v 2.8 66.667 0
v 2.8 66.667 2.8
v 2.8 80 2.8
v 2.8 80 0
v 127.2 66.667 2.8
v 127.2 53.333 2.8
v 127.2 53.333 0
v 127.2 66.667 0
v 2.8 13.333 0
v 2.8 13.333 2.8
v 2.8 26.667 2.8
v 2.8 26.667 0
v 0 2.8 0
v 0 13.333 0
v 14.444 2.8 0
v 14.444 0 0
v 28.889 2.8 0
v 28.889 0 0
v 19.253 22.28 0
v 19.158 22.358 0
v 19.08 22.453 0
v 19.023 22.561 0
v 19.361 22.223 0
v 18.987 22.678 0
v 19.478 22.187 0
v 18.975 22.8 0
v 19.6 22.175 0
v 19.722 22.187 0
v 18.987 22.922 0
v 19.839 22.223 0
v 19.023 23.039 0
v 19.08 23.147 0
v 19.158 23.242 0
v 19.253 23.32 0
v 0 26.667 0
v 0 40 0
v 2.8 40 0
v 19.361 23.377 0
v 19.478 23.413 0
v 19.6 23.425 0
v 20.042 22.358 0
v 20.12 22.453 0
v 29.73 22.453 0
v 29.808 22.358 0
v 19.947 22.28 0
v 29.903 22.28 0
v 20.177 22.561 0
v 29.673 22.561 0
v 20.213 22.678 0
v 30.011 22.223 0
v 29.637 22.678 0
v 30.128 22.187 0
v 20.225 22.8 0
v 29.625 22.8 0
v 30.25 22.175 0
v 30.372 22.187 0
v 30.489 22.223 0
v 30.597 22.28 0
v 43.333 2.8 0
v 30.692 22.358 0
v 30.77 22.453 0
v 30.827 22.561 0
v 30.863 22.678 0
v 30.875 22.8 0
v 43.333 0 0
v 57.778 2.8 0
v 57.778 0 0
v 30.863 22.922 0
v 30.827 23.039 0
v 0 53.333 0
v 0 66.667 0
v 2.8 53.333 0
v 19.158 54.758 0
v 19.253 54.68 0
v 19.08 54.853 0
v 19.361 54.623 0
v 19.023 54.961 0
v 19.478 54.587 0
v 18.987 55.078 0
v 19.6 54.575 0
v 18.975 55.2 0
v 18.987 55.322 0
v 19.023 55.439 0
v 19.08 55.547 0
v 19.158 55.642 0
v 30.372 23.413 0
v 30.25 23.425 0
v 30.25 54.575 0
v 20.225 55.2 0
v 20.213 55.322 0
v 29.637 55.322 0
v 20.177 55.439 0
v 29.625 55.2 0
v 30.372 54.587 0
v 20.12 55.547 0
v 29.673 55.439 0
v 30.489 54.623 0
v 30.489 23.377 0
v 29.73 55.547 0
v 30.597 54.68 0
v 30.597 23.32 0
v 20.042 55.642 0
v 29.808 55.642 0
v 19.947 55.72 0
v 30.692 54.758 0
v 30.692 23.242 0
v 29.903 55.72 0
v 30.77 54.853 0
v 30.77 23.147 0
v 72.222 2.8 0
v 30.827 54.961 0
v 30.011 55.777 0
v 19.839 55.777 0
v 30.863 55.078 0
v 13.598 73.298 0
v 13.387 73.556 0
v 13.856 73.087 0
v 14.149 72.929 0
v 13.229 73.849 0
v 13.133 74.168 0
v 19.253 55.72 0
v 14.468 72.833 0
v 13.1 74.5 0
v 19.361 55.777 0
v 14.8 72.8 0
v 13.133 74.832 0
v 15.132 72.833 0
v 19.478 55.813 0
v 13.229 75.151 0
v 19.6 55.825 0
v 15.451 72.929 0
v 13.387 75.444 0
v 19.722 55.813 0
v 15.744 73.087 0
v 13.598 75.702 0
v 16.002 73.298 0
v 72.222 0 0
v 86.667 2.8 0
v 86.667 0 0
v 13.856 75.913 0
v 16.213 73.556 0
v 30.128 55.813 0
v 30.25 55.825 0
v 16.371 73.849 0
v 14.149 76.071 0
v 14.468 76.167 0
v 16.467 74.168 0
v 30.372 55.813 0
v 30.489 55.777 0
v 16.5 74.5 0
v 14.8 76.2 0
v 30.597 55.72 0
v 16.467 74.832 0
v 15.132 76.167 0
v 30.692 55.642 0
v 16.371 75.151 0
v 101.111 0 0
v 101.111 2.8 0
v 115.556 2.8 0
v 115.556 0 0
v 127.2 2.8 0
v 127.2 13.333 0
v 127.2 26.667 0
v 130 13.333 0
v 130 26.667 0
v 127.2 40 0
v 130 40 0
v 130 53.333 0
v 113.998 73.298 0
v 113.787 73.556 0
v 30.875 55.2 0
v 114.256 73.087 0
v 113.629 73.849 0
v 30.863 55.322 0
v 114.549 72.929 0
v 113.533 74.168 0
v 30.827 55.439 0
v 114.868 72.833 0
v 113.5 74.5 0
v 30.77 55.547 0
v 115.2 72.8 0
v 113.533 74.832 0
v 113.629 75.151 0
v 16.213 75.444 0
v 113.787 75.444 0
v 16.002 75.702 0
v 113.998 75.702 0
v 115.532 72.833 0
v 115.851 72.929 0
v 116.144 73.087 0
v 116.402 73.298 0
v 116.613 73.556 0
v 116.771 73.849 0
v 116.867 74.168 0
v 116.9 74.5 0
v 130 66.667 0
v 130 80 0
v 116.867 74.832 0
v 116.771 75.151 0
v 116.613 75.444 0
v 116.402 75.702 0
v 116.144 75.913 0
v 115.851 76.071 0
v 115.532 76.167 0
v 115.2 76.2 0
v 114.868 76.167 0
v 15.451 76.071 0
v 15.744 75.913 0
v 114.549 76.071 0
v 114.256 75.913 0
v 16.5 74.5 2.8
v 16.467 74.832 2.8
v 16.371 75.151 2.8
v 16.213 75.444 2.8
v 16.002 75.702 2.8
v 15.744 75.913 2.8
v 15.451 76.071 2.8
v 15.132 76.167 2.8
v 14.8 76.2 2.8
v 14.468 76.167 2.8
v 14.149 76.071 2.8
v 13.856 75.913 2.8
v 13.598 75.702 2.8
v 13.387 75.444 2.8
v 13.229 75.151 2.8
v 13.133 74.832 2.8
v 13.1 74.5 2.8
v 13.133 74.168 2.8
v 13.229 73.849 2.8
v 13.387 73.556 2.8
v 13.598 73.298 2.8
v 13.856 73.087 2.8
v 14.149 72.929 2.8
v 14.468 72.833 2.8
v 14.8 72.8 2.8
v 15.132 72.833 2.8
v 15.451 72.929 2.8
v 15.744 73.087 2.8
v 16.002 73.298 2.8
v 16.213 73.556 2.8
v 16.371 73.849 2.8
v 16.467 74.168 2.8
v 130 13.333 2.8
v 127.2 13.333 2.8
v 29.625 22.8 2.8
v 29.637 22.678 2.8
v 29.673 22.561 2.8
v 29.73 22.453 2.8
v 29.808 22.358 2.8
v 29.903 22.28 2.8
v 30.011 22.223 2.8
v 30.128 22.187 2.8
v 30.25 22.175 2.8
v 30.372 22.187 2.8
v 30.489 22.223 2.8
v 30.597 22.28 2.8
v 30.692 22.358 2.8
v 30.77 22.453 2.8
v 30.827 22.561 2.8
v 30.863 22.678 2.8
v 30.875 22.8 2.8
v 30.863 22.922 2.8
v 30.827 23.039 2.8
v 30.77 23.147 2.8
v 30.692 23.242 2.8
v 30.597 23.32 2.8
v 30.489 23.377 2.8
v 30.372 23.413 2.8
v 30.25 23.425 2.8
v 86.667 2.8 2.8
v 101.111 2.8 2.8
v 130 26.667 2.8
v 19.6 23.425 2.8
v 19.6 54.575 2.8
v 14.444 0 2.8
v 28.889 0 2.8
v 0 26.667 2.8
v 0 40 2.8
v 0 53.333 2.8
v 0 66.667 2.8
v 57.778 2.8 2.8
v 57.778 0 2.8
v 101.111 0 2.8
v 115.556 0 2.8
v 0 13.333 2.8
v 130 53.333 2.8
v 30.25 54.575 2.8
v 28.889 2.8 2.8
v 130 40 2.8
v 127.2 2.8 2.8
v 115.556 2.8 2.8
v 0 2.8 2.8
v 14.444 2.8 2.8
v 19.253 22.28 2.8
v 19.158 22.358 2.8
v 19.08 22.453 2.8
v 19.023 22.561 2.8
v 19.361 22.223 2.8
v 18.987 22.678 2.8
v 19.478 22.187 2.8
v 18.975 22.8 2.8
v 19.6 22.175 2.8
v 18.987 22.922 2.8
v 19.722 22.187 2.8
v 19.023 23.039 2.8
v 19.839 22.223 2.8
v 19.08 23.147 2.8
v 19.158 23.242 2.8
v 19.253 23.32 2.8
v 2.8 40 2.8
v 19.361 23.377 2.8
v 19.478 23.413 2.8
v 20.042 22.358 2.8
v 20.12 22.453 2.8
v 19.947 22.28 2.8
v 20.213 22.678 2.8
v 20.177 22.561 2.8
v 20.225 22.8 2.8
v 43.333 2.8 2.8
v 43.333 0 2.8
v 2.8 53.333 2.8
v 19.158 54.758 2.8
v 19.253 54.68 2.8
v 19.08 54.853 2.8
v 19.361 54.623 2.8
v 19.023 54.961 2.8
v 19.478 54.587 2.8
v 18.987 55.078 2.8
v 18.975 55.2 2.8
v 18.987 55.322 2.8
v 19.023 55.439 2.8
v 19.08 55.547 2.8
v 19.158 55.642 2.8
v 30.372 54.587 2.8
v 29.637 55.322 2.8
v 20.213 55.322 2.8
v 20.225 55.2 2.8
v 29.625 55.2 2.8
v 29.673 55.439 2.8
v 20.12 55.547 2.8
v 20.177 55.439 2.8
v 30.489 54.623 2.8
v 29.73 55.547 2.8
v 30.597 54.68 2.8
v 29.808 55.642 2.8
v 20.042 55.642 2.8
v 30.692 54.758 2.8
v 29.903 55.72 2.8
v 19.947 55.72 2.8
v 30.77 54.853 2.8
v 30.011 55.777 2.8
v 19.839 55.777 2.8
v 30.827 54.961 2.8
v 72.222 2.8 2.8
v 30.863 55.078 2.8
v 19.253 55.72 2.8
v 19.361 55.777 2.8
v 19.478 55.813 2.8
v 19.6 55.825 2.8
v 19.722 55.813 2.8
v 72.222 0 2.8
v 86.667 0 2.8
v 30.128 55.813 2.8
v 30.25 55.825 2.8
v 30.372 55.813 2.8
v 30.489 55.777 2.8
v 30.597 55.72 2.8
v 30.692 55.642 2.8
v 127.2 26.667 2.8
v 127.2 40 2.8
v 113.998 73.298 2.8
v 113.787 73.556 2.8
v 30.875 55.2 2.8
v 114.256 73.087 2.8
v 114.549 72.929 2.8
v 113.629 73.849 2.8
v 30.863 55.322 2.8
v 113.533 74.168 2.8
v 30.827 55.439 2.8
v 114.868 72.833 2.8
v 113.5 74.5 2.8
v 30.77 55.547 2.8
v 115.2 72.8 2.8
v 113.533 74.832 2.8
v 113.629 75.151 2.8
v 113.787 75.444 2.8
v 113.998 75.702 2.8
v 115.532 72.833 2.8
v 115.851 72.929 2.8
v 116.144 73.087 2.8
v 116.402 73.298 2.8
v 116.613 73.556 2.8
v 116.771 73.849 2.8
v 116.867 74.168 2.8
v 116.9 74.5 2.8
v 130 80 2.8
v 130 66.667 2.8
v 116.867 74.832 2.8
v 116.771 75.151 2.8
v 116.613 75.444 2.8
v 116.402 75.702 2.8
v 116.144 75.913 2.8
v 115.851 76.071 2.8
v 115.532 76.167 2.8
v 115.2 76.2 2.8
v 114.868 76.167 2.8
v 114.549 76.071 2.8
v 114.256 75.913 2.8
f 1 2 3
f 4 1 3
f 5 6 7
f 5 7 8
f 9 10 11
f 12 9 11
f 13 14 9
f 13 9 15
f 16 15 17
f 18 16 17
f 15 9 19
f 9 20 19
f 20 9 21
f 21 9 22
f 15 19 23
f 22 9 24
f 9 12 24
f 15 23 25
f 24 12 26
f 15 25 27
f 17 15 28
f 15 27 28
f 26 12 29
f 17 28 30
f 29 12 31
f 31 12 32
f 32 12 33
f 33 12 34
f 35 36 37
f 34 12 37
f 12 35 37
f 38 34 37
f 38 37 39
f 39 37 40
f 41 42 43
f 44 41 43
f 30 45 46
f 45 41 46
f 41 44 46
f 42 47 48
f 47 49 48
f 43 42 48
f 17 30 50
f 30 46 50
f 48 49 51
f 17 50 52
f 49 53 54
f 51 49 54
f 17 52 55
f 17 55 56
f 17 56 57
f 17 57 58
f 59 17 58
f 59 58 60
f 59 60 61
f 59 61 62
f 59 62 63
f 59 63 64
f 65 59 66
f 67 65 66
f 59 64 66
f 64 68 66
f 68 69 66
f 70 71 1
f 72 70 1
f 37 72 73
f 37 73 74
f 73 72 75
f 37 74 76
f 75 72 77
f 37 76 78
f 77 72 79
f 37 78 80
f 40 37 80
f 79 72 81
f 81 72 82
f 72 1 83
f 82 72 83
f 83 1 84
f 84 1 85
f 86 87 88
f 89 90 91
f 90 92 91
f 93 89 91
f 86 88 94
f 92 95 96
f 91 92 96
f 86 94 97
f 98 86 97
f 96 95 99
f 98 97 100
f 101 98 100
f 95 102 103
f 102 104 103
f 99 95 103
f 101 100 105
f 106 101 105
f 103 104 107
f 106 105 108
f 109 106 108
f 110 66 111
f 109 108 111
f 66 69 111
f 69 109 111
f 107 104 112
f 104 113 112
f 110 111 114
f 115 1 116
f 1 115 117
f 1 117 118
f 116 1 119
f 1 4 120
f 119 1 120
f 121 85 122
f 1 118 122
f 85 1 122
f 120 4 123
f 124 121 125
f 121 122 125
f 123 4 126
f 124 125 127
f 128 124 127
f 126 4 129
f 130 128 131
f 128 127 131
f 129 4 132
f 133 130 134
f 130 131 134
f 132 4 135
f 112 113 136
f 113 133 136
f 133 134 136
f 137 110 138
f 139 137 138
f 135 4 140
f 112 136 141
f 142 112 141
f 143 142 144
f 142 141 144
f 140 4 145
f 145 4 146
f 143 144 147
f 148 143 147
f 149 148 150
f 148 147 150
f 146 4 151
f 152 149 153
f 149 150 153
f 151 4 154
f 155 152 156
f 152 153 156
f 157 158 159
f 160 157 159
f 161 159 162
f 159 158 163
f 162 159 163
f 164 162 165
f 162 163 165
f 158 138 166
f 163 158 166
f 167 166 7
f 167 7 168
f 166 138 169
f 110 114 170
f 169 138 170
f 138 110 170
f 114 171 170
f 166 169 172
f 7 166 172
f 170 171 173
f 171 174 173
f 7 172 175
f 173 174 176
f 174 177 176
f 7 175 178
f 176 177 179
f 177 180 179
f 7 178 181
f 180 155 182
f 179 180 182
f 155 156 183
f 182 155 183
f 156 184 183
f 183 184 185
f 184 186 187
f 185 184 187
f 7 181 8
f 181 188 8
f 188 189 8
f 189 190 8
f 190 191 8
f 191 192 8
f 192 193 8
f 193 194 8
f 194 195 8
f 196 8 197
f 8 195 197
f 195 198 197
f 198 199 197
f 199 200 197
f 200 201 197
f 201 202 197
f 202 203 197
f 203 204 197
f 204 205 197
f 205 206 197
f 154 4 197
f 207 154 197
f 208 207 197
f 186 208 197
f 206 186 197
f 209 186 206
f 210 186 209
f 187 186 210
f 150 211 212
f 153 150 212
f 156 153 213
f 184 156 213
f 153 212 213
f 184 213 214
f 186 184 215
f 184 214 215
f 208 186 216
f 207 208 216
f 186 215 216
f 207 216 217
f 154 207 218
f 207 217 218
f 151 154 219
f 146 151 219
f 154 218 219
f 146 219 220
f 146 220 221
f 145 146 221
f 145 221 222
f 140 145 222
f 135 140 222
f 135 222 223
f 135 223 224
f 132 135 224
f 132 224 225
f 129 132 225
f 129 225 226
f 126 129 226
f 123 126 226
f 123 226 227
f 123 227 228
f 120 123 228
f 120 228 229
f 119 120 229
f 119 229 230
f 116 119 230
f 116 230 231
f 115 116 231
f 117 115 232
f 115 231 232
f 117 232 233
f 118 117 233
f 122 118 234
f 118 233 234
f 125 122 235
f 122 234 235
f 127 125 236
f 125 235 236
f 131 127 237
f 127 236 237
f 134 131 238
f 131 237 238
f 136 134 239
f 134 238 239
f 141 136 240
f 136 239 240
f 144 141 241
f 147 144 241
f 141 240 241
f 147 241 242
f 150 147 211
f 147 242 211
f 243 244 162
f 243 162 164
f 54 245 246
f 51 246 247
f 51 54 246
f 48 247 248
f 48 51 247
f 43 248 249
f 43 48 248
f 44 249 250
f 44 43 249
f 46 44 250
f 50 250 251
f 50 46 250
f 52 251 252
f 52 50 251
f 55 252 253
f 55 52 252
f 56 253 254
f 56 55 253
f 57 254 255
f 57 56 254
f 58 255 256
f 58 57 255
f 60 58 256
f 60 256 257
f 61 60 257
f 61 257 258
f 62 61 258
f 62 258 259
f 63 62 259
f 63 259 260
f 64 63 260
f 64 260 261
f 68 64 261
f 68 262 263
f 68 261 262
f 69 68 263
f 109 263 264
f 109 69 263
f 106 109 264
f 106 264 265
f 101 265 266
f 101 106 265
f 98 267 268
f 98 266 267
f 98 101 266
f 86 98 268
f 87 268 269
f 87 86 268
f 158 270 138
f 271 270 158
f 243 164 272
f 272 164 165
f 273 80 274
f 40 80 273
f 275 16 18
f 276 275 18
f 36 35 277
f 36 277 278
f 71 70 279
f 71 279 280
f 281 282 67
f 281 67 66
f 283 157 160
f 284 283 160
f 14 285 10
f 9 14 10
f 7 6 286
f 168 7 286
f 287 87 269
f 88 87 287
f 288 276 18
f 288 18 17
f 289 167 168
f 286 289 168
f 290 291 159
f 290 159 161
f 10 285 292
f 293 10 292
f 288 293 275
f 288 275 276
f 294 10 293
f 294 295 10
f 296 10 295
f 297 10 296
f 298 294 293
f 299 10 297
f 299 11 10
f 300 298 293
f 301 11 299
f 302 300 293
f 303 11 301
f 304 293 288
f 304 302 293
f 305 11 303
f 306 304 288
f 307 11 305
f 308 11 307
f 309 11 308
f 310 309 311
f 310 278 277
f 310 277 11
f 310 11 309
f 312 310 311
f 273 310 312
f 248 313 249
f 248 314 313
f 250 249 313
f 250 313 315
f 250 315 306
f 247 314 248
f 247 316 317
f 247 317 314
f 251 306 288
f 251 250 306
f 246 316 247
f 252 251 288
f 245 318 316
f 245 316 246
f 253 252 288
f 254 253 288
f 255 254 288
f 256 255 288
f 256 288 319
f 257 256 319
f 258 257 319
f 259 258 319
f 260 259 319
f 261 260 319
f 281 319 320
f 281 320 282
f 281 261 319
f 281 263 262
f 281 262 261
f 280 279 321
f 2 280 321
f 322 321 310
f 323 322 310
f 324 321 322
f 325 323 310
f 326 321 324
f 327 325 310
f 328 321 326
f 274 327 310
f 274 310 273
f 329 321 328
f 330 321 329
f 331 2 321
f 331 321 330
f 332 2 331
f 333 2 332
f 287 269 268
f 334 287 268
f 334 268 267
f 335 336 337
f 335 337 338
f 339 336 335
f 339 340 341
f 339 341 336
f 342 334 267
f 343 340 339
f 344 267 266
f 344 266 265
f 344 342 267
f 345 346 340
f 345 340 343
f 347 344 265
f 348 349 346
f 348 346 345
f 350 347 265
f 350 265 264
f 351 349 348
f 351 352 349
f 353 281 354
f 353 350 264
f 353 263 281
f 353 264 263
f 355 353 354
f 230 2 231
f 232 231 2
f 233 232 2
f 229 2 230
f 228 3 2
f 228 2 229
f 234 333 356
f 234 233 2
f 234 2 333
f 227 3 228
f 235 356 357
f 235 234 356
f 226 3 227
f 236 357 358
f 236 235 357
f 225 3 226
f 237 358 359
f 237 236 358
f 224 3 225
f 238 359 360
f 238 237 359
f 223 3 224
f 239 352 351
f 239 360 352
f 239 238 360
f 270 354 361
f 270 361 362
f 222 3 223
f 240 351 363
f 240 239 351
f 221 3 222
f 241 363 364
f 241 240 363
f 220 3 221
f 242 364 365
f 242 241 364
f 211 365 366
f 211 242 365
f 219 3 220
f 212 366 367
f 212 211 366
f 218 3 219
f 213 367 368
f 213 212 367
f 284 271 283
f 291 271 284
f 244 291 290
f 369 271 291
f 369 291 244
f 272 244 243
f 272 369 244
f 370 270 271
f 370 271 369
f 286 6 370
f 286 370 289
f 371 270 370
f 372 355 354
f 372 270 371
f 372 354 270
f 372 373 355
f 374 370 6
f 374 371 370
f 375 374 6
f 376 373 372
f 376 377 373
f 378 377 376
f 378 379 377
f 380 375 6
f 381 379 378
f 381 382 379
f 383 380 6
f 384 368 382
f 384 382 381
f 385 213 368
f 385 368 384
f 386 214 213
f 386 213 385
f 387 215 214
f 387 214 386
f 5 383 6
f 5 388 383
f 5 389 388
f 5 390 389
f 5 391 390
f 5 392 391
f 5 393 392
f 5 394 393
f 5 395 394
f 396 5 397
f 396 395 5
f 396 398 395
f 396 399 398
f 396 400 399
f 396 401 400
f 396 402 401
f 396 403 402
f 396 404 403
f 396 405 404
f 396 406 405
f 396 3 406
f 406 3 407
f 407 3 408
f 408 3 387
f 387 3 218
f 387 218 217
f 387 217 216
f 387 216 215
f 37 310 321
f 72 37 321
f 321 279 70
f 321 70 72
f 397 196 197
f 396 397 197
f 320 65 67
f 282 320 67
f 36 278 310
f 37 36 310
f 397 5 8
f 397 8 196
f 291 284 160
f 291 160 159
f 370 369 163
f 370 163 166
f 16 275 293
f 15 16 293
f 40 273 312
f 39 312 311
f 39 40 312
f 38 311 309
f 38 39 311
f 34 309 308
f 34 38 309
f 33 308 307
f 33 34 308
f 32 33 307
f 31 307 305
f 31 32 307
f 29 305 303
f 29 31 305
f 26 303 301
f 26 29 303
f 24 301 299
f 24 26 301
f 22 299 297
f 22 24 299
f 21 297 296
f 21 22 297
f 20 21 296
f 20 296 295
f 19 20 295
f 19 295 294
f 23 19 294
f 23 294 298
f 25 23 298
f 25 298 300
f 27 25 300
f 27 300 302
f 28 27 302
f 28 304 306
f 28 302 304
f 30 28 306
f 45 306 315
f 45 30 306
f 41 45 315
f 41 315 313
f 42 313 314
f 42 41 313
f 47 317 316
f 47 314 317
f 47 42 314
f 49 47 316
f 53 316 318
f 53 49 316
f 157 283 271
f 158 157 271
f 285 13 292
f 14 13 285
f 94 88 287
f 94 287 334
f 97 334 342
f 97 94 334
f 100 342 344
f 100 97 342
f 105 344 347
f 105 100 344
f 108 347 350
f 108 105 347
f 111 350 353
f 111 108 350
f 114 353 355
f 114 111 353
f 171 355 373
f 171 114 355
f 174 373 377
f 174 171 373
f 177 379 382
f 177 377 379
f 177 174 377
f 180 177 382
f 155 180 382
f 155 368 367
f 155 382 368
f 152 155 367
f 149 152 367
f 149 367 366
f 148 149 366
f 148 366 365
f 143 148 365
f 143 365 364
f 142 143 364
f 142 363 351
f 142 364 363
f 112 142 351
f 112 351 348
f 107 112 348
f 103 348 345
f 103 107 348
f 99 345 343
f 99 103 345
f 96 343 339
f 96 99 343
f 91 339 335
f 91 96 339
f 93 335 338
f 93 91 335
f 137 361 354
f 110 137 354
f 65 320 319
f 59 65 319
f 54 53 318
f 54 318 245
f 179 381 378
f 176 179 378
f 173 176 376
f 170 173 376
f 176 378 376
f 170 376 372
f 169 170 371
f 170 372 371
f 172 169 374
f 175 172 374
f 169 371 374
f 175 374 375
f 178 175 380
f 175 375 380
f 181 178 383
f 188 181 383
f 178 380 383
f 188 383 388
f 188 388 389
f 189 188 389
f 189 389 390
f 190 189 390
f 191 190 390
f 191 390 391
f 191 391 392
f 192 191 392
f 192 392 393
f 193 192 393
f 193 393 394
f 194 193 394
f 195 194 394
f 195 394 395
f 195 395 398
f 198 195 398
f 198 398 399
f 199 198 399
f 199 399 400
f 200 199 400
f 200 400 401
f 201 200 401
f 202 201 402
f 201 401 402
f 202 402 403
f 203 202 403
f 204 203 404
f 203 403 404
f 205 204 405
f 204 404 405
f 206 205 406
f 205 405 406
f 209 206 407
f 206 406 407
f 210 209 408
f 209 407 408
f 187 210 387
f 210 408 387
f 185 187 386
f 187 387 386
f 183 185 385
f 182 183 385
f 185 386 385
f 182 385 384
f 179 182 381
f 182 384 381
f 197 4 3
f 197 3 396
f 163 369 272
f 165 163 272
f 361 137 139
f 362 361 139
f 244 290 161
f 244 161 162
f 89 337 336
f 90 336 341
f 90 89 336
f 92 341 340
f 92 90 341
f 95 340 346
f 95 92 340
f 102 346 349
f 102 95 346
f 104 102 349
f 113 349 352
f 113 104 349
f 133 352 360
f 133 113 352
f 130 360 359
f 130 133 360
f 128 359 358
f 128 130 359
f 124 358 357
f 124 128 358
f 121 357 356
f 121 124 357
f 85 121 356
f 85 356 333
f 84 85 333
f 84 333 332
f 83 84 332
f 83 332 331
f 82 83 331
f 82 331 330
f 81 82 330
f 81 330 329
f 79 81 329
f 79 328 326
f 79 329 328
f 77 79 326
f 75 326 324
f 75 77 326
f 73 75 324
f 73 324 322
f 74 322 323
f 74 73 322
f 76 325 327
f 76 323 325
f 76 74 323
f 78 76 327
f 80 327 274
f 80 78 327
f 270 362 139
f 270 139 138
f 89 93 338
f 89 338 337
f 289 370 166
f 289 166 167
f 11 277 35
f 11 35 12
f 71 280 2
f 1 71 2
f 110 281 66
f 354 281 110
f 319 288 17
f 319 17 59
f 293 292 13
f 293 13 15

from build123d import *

# Parameters (mm, degrees)
SKETCH1_W           = 130
SKETCH1_H           = 80
BOSS_EXTRUDE1_DEPTH = 2.8
SKETCH2_W           = 14.444444444
SKETCH2_H           = 2.8
SKETCH2_W_2         = 2.8
SKETCH2_H_2         = 13.333333334
SKETCH2_H_3         = 13.333333333
CUT_EXTRUDE1_DEPTH  = 153.669053839
CUT_EXTRUDE2_REACH  = 154.669
SKETCH3_R           = 1.7
CUT_EXTRUDE3_REACH  = 154.669


with BuildPart() as part:
    # Sketch1 → Boss-Extrude1 (new body)
    with BuildSketch(Plane.XY):
        with Locations((65, 40)):
            Rectangle(SKETCH1_W, SKETCH1_H)
    extrude(amount=BOSS_EXTRUDE1_DEPTH)

    # Sketch2 → Cut-Extrude1 (cut, through all)
    with BuildSketch(Plane.XY.offset(2.8)):
        with Locations((7.222222222, 1.4)):
            Rectangle(SKETCH2_W, SKETCH2_H)
        with Locations((36.111111111, 1.4)):
            Rectangle(SKETCH2_W, SKETCH2_H)
        with Locations((65, 1.4)):
            Rectangle(SKETCH2_W, SKETCH2_H)
        with Locations((93.888888889, 1.4)):
            Rectangle(SKETCH2_W, SKETCH2_H)
        Polygon((115.555555556, 0), (115.555555556, 2.8), (127.2, 2.8), (127.2, 13.333333333), (130, 13.333333333), (130, 0), align=None)
        with Locations((1.4, 20)):
            Rectangle(SKETCH2_W_2, SKETCH2_H_2)
        with Locations((1.4, 46.666666667)):
            Rectangle(SKETCH2_W_2, SKETCH2_H_3)
        with Locations((1.4, 73.333333334)):
            Rectangle(SKETCH2_W_2, SKETCH2_H_3)
        with Locations((128.6, 33.333333334)):
            Rectangle(SKETCH2_W_2, SKETCH2_H_3)
        with Locations((128.6, 60)):
            Rectangle(SKETCH2_W_2, SKETCH2_H_2)
    extrude(amount=-CUT_EXTRUDE1_DEPTH, mode=Mode.SUBTRACT)

    # Sketch3 → Cut-Extrude2 (cut, up to next)
    with BuildSketch(Plane.XY.offset(2.8), mode=Mode.PRIVATE) as cut_extrude2_sk1:
        with Locations((14.8, 74.5)):
            Circle(SKETCH3_R)
    cut_extrude2_tool1 = extrude(cut_extrude2_sk1.sketch, amount=-CUT_EXTRUDE2_REACH, mode=Mode.PRIVATE) & part.part
    # Sketch3 → Cut-Extrude2 (cut, up to next)
    with BuildSketch(Plane.XY.offset(2.8), mode=Mode.PRIVATE) as cut_extrude2_sk2:
        with Locations(Location((115.2, 74.5, 0), (0, 0, 180))):
            Circle(SKETCH3_R)
    cut_extrude2_tool2 = extrude(cut_extrude2_sk2.sketch, amount=-CUT_EXTRUDE2_REACH, mode=Mode.PRIVATE) & part.part
    add(cut_extrude2_tool1.solids().sort_by_distance((14.8, 74.5, 2.8))[0], mode=Mode.SUBTRACT)
    add(cut_extrude2_tool2.solids().sort_by_distance((115.2, 74.5, 2.8))[0], mode=Mode.SUBTRACT)

    # Sketch4 → Cut-Extrude3 (cut, up to next)
    with BuildSketch(Plane(origin=(0, 0, 0), x_dir=(-1, 0, 0), z_dir=(0, 0, -1)), mode=Mode.PRIVATE) as cut_extrude3_sk1:
        with BuildLine():
            Line((-29.625, 55.2), (-20.225, 55.2))
            ThreePointArc((-20.225, 55.2), (-19.158058262, 55.641941738), (-19.6, 54.575))
            Line((-19.6, 54.575), (-19.6, 23.425))
            ThreePointArc((-19.6, 23.425), (-19.158058262, 22.358058262), (-20.225, 22.8))
            Line((-20.225, 22.8), (-29.625, 22.8))
            ThreePointArc((-29.625, 22.8), (-30.691941738, 22.358058262), (-30.25, 23.425))
            Line((-30.25, 23.425), (-30.25, 54.575))
            ThreePointArc((-30.25, 54.575), (-30.691941738, 55.641941738), (-29.625, 55.2))
        make_face()
    cut_extrude3_tool1 = extrude(cut_extrude3_sk1.sketch, amount=-CUT_EXTRUDE3_REACH, mode=Mode.PRIVATE) & part.part
    add(cut_extrude3_tool1.solids().sort_by_distance((24.925, 39, 0))[0], mode=Mode.SUBTRACT)


solid = part.part
